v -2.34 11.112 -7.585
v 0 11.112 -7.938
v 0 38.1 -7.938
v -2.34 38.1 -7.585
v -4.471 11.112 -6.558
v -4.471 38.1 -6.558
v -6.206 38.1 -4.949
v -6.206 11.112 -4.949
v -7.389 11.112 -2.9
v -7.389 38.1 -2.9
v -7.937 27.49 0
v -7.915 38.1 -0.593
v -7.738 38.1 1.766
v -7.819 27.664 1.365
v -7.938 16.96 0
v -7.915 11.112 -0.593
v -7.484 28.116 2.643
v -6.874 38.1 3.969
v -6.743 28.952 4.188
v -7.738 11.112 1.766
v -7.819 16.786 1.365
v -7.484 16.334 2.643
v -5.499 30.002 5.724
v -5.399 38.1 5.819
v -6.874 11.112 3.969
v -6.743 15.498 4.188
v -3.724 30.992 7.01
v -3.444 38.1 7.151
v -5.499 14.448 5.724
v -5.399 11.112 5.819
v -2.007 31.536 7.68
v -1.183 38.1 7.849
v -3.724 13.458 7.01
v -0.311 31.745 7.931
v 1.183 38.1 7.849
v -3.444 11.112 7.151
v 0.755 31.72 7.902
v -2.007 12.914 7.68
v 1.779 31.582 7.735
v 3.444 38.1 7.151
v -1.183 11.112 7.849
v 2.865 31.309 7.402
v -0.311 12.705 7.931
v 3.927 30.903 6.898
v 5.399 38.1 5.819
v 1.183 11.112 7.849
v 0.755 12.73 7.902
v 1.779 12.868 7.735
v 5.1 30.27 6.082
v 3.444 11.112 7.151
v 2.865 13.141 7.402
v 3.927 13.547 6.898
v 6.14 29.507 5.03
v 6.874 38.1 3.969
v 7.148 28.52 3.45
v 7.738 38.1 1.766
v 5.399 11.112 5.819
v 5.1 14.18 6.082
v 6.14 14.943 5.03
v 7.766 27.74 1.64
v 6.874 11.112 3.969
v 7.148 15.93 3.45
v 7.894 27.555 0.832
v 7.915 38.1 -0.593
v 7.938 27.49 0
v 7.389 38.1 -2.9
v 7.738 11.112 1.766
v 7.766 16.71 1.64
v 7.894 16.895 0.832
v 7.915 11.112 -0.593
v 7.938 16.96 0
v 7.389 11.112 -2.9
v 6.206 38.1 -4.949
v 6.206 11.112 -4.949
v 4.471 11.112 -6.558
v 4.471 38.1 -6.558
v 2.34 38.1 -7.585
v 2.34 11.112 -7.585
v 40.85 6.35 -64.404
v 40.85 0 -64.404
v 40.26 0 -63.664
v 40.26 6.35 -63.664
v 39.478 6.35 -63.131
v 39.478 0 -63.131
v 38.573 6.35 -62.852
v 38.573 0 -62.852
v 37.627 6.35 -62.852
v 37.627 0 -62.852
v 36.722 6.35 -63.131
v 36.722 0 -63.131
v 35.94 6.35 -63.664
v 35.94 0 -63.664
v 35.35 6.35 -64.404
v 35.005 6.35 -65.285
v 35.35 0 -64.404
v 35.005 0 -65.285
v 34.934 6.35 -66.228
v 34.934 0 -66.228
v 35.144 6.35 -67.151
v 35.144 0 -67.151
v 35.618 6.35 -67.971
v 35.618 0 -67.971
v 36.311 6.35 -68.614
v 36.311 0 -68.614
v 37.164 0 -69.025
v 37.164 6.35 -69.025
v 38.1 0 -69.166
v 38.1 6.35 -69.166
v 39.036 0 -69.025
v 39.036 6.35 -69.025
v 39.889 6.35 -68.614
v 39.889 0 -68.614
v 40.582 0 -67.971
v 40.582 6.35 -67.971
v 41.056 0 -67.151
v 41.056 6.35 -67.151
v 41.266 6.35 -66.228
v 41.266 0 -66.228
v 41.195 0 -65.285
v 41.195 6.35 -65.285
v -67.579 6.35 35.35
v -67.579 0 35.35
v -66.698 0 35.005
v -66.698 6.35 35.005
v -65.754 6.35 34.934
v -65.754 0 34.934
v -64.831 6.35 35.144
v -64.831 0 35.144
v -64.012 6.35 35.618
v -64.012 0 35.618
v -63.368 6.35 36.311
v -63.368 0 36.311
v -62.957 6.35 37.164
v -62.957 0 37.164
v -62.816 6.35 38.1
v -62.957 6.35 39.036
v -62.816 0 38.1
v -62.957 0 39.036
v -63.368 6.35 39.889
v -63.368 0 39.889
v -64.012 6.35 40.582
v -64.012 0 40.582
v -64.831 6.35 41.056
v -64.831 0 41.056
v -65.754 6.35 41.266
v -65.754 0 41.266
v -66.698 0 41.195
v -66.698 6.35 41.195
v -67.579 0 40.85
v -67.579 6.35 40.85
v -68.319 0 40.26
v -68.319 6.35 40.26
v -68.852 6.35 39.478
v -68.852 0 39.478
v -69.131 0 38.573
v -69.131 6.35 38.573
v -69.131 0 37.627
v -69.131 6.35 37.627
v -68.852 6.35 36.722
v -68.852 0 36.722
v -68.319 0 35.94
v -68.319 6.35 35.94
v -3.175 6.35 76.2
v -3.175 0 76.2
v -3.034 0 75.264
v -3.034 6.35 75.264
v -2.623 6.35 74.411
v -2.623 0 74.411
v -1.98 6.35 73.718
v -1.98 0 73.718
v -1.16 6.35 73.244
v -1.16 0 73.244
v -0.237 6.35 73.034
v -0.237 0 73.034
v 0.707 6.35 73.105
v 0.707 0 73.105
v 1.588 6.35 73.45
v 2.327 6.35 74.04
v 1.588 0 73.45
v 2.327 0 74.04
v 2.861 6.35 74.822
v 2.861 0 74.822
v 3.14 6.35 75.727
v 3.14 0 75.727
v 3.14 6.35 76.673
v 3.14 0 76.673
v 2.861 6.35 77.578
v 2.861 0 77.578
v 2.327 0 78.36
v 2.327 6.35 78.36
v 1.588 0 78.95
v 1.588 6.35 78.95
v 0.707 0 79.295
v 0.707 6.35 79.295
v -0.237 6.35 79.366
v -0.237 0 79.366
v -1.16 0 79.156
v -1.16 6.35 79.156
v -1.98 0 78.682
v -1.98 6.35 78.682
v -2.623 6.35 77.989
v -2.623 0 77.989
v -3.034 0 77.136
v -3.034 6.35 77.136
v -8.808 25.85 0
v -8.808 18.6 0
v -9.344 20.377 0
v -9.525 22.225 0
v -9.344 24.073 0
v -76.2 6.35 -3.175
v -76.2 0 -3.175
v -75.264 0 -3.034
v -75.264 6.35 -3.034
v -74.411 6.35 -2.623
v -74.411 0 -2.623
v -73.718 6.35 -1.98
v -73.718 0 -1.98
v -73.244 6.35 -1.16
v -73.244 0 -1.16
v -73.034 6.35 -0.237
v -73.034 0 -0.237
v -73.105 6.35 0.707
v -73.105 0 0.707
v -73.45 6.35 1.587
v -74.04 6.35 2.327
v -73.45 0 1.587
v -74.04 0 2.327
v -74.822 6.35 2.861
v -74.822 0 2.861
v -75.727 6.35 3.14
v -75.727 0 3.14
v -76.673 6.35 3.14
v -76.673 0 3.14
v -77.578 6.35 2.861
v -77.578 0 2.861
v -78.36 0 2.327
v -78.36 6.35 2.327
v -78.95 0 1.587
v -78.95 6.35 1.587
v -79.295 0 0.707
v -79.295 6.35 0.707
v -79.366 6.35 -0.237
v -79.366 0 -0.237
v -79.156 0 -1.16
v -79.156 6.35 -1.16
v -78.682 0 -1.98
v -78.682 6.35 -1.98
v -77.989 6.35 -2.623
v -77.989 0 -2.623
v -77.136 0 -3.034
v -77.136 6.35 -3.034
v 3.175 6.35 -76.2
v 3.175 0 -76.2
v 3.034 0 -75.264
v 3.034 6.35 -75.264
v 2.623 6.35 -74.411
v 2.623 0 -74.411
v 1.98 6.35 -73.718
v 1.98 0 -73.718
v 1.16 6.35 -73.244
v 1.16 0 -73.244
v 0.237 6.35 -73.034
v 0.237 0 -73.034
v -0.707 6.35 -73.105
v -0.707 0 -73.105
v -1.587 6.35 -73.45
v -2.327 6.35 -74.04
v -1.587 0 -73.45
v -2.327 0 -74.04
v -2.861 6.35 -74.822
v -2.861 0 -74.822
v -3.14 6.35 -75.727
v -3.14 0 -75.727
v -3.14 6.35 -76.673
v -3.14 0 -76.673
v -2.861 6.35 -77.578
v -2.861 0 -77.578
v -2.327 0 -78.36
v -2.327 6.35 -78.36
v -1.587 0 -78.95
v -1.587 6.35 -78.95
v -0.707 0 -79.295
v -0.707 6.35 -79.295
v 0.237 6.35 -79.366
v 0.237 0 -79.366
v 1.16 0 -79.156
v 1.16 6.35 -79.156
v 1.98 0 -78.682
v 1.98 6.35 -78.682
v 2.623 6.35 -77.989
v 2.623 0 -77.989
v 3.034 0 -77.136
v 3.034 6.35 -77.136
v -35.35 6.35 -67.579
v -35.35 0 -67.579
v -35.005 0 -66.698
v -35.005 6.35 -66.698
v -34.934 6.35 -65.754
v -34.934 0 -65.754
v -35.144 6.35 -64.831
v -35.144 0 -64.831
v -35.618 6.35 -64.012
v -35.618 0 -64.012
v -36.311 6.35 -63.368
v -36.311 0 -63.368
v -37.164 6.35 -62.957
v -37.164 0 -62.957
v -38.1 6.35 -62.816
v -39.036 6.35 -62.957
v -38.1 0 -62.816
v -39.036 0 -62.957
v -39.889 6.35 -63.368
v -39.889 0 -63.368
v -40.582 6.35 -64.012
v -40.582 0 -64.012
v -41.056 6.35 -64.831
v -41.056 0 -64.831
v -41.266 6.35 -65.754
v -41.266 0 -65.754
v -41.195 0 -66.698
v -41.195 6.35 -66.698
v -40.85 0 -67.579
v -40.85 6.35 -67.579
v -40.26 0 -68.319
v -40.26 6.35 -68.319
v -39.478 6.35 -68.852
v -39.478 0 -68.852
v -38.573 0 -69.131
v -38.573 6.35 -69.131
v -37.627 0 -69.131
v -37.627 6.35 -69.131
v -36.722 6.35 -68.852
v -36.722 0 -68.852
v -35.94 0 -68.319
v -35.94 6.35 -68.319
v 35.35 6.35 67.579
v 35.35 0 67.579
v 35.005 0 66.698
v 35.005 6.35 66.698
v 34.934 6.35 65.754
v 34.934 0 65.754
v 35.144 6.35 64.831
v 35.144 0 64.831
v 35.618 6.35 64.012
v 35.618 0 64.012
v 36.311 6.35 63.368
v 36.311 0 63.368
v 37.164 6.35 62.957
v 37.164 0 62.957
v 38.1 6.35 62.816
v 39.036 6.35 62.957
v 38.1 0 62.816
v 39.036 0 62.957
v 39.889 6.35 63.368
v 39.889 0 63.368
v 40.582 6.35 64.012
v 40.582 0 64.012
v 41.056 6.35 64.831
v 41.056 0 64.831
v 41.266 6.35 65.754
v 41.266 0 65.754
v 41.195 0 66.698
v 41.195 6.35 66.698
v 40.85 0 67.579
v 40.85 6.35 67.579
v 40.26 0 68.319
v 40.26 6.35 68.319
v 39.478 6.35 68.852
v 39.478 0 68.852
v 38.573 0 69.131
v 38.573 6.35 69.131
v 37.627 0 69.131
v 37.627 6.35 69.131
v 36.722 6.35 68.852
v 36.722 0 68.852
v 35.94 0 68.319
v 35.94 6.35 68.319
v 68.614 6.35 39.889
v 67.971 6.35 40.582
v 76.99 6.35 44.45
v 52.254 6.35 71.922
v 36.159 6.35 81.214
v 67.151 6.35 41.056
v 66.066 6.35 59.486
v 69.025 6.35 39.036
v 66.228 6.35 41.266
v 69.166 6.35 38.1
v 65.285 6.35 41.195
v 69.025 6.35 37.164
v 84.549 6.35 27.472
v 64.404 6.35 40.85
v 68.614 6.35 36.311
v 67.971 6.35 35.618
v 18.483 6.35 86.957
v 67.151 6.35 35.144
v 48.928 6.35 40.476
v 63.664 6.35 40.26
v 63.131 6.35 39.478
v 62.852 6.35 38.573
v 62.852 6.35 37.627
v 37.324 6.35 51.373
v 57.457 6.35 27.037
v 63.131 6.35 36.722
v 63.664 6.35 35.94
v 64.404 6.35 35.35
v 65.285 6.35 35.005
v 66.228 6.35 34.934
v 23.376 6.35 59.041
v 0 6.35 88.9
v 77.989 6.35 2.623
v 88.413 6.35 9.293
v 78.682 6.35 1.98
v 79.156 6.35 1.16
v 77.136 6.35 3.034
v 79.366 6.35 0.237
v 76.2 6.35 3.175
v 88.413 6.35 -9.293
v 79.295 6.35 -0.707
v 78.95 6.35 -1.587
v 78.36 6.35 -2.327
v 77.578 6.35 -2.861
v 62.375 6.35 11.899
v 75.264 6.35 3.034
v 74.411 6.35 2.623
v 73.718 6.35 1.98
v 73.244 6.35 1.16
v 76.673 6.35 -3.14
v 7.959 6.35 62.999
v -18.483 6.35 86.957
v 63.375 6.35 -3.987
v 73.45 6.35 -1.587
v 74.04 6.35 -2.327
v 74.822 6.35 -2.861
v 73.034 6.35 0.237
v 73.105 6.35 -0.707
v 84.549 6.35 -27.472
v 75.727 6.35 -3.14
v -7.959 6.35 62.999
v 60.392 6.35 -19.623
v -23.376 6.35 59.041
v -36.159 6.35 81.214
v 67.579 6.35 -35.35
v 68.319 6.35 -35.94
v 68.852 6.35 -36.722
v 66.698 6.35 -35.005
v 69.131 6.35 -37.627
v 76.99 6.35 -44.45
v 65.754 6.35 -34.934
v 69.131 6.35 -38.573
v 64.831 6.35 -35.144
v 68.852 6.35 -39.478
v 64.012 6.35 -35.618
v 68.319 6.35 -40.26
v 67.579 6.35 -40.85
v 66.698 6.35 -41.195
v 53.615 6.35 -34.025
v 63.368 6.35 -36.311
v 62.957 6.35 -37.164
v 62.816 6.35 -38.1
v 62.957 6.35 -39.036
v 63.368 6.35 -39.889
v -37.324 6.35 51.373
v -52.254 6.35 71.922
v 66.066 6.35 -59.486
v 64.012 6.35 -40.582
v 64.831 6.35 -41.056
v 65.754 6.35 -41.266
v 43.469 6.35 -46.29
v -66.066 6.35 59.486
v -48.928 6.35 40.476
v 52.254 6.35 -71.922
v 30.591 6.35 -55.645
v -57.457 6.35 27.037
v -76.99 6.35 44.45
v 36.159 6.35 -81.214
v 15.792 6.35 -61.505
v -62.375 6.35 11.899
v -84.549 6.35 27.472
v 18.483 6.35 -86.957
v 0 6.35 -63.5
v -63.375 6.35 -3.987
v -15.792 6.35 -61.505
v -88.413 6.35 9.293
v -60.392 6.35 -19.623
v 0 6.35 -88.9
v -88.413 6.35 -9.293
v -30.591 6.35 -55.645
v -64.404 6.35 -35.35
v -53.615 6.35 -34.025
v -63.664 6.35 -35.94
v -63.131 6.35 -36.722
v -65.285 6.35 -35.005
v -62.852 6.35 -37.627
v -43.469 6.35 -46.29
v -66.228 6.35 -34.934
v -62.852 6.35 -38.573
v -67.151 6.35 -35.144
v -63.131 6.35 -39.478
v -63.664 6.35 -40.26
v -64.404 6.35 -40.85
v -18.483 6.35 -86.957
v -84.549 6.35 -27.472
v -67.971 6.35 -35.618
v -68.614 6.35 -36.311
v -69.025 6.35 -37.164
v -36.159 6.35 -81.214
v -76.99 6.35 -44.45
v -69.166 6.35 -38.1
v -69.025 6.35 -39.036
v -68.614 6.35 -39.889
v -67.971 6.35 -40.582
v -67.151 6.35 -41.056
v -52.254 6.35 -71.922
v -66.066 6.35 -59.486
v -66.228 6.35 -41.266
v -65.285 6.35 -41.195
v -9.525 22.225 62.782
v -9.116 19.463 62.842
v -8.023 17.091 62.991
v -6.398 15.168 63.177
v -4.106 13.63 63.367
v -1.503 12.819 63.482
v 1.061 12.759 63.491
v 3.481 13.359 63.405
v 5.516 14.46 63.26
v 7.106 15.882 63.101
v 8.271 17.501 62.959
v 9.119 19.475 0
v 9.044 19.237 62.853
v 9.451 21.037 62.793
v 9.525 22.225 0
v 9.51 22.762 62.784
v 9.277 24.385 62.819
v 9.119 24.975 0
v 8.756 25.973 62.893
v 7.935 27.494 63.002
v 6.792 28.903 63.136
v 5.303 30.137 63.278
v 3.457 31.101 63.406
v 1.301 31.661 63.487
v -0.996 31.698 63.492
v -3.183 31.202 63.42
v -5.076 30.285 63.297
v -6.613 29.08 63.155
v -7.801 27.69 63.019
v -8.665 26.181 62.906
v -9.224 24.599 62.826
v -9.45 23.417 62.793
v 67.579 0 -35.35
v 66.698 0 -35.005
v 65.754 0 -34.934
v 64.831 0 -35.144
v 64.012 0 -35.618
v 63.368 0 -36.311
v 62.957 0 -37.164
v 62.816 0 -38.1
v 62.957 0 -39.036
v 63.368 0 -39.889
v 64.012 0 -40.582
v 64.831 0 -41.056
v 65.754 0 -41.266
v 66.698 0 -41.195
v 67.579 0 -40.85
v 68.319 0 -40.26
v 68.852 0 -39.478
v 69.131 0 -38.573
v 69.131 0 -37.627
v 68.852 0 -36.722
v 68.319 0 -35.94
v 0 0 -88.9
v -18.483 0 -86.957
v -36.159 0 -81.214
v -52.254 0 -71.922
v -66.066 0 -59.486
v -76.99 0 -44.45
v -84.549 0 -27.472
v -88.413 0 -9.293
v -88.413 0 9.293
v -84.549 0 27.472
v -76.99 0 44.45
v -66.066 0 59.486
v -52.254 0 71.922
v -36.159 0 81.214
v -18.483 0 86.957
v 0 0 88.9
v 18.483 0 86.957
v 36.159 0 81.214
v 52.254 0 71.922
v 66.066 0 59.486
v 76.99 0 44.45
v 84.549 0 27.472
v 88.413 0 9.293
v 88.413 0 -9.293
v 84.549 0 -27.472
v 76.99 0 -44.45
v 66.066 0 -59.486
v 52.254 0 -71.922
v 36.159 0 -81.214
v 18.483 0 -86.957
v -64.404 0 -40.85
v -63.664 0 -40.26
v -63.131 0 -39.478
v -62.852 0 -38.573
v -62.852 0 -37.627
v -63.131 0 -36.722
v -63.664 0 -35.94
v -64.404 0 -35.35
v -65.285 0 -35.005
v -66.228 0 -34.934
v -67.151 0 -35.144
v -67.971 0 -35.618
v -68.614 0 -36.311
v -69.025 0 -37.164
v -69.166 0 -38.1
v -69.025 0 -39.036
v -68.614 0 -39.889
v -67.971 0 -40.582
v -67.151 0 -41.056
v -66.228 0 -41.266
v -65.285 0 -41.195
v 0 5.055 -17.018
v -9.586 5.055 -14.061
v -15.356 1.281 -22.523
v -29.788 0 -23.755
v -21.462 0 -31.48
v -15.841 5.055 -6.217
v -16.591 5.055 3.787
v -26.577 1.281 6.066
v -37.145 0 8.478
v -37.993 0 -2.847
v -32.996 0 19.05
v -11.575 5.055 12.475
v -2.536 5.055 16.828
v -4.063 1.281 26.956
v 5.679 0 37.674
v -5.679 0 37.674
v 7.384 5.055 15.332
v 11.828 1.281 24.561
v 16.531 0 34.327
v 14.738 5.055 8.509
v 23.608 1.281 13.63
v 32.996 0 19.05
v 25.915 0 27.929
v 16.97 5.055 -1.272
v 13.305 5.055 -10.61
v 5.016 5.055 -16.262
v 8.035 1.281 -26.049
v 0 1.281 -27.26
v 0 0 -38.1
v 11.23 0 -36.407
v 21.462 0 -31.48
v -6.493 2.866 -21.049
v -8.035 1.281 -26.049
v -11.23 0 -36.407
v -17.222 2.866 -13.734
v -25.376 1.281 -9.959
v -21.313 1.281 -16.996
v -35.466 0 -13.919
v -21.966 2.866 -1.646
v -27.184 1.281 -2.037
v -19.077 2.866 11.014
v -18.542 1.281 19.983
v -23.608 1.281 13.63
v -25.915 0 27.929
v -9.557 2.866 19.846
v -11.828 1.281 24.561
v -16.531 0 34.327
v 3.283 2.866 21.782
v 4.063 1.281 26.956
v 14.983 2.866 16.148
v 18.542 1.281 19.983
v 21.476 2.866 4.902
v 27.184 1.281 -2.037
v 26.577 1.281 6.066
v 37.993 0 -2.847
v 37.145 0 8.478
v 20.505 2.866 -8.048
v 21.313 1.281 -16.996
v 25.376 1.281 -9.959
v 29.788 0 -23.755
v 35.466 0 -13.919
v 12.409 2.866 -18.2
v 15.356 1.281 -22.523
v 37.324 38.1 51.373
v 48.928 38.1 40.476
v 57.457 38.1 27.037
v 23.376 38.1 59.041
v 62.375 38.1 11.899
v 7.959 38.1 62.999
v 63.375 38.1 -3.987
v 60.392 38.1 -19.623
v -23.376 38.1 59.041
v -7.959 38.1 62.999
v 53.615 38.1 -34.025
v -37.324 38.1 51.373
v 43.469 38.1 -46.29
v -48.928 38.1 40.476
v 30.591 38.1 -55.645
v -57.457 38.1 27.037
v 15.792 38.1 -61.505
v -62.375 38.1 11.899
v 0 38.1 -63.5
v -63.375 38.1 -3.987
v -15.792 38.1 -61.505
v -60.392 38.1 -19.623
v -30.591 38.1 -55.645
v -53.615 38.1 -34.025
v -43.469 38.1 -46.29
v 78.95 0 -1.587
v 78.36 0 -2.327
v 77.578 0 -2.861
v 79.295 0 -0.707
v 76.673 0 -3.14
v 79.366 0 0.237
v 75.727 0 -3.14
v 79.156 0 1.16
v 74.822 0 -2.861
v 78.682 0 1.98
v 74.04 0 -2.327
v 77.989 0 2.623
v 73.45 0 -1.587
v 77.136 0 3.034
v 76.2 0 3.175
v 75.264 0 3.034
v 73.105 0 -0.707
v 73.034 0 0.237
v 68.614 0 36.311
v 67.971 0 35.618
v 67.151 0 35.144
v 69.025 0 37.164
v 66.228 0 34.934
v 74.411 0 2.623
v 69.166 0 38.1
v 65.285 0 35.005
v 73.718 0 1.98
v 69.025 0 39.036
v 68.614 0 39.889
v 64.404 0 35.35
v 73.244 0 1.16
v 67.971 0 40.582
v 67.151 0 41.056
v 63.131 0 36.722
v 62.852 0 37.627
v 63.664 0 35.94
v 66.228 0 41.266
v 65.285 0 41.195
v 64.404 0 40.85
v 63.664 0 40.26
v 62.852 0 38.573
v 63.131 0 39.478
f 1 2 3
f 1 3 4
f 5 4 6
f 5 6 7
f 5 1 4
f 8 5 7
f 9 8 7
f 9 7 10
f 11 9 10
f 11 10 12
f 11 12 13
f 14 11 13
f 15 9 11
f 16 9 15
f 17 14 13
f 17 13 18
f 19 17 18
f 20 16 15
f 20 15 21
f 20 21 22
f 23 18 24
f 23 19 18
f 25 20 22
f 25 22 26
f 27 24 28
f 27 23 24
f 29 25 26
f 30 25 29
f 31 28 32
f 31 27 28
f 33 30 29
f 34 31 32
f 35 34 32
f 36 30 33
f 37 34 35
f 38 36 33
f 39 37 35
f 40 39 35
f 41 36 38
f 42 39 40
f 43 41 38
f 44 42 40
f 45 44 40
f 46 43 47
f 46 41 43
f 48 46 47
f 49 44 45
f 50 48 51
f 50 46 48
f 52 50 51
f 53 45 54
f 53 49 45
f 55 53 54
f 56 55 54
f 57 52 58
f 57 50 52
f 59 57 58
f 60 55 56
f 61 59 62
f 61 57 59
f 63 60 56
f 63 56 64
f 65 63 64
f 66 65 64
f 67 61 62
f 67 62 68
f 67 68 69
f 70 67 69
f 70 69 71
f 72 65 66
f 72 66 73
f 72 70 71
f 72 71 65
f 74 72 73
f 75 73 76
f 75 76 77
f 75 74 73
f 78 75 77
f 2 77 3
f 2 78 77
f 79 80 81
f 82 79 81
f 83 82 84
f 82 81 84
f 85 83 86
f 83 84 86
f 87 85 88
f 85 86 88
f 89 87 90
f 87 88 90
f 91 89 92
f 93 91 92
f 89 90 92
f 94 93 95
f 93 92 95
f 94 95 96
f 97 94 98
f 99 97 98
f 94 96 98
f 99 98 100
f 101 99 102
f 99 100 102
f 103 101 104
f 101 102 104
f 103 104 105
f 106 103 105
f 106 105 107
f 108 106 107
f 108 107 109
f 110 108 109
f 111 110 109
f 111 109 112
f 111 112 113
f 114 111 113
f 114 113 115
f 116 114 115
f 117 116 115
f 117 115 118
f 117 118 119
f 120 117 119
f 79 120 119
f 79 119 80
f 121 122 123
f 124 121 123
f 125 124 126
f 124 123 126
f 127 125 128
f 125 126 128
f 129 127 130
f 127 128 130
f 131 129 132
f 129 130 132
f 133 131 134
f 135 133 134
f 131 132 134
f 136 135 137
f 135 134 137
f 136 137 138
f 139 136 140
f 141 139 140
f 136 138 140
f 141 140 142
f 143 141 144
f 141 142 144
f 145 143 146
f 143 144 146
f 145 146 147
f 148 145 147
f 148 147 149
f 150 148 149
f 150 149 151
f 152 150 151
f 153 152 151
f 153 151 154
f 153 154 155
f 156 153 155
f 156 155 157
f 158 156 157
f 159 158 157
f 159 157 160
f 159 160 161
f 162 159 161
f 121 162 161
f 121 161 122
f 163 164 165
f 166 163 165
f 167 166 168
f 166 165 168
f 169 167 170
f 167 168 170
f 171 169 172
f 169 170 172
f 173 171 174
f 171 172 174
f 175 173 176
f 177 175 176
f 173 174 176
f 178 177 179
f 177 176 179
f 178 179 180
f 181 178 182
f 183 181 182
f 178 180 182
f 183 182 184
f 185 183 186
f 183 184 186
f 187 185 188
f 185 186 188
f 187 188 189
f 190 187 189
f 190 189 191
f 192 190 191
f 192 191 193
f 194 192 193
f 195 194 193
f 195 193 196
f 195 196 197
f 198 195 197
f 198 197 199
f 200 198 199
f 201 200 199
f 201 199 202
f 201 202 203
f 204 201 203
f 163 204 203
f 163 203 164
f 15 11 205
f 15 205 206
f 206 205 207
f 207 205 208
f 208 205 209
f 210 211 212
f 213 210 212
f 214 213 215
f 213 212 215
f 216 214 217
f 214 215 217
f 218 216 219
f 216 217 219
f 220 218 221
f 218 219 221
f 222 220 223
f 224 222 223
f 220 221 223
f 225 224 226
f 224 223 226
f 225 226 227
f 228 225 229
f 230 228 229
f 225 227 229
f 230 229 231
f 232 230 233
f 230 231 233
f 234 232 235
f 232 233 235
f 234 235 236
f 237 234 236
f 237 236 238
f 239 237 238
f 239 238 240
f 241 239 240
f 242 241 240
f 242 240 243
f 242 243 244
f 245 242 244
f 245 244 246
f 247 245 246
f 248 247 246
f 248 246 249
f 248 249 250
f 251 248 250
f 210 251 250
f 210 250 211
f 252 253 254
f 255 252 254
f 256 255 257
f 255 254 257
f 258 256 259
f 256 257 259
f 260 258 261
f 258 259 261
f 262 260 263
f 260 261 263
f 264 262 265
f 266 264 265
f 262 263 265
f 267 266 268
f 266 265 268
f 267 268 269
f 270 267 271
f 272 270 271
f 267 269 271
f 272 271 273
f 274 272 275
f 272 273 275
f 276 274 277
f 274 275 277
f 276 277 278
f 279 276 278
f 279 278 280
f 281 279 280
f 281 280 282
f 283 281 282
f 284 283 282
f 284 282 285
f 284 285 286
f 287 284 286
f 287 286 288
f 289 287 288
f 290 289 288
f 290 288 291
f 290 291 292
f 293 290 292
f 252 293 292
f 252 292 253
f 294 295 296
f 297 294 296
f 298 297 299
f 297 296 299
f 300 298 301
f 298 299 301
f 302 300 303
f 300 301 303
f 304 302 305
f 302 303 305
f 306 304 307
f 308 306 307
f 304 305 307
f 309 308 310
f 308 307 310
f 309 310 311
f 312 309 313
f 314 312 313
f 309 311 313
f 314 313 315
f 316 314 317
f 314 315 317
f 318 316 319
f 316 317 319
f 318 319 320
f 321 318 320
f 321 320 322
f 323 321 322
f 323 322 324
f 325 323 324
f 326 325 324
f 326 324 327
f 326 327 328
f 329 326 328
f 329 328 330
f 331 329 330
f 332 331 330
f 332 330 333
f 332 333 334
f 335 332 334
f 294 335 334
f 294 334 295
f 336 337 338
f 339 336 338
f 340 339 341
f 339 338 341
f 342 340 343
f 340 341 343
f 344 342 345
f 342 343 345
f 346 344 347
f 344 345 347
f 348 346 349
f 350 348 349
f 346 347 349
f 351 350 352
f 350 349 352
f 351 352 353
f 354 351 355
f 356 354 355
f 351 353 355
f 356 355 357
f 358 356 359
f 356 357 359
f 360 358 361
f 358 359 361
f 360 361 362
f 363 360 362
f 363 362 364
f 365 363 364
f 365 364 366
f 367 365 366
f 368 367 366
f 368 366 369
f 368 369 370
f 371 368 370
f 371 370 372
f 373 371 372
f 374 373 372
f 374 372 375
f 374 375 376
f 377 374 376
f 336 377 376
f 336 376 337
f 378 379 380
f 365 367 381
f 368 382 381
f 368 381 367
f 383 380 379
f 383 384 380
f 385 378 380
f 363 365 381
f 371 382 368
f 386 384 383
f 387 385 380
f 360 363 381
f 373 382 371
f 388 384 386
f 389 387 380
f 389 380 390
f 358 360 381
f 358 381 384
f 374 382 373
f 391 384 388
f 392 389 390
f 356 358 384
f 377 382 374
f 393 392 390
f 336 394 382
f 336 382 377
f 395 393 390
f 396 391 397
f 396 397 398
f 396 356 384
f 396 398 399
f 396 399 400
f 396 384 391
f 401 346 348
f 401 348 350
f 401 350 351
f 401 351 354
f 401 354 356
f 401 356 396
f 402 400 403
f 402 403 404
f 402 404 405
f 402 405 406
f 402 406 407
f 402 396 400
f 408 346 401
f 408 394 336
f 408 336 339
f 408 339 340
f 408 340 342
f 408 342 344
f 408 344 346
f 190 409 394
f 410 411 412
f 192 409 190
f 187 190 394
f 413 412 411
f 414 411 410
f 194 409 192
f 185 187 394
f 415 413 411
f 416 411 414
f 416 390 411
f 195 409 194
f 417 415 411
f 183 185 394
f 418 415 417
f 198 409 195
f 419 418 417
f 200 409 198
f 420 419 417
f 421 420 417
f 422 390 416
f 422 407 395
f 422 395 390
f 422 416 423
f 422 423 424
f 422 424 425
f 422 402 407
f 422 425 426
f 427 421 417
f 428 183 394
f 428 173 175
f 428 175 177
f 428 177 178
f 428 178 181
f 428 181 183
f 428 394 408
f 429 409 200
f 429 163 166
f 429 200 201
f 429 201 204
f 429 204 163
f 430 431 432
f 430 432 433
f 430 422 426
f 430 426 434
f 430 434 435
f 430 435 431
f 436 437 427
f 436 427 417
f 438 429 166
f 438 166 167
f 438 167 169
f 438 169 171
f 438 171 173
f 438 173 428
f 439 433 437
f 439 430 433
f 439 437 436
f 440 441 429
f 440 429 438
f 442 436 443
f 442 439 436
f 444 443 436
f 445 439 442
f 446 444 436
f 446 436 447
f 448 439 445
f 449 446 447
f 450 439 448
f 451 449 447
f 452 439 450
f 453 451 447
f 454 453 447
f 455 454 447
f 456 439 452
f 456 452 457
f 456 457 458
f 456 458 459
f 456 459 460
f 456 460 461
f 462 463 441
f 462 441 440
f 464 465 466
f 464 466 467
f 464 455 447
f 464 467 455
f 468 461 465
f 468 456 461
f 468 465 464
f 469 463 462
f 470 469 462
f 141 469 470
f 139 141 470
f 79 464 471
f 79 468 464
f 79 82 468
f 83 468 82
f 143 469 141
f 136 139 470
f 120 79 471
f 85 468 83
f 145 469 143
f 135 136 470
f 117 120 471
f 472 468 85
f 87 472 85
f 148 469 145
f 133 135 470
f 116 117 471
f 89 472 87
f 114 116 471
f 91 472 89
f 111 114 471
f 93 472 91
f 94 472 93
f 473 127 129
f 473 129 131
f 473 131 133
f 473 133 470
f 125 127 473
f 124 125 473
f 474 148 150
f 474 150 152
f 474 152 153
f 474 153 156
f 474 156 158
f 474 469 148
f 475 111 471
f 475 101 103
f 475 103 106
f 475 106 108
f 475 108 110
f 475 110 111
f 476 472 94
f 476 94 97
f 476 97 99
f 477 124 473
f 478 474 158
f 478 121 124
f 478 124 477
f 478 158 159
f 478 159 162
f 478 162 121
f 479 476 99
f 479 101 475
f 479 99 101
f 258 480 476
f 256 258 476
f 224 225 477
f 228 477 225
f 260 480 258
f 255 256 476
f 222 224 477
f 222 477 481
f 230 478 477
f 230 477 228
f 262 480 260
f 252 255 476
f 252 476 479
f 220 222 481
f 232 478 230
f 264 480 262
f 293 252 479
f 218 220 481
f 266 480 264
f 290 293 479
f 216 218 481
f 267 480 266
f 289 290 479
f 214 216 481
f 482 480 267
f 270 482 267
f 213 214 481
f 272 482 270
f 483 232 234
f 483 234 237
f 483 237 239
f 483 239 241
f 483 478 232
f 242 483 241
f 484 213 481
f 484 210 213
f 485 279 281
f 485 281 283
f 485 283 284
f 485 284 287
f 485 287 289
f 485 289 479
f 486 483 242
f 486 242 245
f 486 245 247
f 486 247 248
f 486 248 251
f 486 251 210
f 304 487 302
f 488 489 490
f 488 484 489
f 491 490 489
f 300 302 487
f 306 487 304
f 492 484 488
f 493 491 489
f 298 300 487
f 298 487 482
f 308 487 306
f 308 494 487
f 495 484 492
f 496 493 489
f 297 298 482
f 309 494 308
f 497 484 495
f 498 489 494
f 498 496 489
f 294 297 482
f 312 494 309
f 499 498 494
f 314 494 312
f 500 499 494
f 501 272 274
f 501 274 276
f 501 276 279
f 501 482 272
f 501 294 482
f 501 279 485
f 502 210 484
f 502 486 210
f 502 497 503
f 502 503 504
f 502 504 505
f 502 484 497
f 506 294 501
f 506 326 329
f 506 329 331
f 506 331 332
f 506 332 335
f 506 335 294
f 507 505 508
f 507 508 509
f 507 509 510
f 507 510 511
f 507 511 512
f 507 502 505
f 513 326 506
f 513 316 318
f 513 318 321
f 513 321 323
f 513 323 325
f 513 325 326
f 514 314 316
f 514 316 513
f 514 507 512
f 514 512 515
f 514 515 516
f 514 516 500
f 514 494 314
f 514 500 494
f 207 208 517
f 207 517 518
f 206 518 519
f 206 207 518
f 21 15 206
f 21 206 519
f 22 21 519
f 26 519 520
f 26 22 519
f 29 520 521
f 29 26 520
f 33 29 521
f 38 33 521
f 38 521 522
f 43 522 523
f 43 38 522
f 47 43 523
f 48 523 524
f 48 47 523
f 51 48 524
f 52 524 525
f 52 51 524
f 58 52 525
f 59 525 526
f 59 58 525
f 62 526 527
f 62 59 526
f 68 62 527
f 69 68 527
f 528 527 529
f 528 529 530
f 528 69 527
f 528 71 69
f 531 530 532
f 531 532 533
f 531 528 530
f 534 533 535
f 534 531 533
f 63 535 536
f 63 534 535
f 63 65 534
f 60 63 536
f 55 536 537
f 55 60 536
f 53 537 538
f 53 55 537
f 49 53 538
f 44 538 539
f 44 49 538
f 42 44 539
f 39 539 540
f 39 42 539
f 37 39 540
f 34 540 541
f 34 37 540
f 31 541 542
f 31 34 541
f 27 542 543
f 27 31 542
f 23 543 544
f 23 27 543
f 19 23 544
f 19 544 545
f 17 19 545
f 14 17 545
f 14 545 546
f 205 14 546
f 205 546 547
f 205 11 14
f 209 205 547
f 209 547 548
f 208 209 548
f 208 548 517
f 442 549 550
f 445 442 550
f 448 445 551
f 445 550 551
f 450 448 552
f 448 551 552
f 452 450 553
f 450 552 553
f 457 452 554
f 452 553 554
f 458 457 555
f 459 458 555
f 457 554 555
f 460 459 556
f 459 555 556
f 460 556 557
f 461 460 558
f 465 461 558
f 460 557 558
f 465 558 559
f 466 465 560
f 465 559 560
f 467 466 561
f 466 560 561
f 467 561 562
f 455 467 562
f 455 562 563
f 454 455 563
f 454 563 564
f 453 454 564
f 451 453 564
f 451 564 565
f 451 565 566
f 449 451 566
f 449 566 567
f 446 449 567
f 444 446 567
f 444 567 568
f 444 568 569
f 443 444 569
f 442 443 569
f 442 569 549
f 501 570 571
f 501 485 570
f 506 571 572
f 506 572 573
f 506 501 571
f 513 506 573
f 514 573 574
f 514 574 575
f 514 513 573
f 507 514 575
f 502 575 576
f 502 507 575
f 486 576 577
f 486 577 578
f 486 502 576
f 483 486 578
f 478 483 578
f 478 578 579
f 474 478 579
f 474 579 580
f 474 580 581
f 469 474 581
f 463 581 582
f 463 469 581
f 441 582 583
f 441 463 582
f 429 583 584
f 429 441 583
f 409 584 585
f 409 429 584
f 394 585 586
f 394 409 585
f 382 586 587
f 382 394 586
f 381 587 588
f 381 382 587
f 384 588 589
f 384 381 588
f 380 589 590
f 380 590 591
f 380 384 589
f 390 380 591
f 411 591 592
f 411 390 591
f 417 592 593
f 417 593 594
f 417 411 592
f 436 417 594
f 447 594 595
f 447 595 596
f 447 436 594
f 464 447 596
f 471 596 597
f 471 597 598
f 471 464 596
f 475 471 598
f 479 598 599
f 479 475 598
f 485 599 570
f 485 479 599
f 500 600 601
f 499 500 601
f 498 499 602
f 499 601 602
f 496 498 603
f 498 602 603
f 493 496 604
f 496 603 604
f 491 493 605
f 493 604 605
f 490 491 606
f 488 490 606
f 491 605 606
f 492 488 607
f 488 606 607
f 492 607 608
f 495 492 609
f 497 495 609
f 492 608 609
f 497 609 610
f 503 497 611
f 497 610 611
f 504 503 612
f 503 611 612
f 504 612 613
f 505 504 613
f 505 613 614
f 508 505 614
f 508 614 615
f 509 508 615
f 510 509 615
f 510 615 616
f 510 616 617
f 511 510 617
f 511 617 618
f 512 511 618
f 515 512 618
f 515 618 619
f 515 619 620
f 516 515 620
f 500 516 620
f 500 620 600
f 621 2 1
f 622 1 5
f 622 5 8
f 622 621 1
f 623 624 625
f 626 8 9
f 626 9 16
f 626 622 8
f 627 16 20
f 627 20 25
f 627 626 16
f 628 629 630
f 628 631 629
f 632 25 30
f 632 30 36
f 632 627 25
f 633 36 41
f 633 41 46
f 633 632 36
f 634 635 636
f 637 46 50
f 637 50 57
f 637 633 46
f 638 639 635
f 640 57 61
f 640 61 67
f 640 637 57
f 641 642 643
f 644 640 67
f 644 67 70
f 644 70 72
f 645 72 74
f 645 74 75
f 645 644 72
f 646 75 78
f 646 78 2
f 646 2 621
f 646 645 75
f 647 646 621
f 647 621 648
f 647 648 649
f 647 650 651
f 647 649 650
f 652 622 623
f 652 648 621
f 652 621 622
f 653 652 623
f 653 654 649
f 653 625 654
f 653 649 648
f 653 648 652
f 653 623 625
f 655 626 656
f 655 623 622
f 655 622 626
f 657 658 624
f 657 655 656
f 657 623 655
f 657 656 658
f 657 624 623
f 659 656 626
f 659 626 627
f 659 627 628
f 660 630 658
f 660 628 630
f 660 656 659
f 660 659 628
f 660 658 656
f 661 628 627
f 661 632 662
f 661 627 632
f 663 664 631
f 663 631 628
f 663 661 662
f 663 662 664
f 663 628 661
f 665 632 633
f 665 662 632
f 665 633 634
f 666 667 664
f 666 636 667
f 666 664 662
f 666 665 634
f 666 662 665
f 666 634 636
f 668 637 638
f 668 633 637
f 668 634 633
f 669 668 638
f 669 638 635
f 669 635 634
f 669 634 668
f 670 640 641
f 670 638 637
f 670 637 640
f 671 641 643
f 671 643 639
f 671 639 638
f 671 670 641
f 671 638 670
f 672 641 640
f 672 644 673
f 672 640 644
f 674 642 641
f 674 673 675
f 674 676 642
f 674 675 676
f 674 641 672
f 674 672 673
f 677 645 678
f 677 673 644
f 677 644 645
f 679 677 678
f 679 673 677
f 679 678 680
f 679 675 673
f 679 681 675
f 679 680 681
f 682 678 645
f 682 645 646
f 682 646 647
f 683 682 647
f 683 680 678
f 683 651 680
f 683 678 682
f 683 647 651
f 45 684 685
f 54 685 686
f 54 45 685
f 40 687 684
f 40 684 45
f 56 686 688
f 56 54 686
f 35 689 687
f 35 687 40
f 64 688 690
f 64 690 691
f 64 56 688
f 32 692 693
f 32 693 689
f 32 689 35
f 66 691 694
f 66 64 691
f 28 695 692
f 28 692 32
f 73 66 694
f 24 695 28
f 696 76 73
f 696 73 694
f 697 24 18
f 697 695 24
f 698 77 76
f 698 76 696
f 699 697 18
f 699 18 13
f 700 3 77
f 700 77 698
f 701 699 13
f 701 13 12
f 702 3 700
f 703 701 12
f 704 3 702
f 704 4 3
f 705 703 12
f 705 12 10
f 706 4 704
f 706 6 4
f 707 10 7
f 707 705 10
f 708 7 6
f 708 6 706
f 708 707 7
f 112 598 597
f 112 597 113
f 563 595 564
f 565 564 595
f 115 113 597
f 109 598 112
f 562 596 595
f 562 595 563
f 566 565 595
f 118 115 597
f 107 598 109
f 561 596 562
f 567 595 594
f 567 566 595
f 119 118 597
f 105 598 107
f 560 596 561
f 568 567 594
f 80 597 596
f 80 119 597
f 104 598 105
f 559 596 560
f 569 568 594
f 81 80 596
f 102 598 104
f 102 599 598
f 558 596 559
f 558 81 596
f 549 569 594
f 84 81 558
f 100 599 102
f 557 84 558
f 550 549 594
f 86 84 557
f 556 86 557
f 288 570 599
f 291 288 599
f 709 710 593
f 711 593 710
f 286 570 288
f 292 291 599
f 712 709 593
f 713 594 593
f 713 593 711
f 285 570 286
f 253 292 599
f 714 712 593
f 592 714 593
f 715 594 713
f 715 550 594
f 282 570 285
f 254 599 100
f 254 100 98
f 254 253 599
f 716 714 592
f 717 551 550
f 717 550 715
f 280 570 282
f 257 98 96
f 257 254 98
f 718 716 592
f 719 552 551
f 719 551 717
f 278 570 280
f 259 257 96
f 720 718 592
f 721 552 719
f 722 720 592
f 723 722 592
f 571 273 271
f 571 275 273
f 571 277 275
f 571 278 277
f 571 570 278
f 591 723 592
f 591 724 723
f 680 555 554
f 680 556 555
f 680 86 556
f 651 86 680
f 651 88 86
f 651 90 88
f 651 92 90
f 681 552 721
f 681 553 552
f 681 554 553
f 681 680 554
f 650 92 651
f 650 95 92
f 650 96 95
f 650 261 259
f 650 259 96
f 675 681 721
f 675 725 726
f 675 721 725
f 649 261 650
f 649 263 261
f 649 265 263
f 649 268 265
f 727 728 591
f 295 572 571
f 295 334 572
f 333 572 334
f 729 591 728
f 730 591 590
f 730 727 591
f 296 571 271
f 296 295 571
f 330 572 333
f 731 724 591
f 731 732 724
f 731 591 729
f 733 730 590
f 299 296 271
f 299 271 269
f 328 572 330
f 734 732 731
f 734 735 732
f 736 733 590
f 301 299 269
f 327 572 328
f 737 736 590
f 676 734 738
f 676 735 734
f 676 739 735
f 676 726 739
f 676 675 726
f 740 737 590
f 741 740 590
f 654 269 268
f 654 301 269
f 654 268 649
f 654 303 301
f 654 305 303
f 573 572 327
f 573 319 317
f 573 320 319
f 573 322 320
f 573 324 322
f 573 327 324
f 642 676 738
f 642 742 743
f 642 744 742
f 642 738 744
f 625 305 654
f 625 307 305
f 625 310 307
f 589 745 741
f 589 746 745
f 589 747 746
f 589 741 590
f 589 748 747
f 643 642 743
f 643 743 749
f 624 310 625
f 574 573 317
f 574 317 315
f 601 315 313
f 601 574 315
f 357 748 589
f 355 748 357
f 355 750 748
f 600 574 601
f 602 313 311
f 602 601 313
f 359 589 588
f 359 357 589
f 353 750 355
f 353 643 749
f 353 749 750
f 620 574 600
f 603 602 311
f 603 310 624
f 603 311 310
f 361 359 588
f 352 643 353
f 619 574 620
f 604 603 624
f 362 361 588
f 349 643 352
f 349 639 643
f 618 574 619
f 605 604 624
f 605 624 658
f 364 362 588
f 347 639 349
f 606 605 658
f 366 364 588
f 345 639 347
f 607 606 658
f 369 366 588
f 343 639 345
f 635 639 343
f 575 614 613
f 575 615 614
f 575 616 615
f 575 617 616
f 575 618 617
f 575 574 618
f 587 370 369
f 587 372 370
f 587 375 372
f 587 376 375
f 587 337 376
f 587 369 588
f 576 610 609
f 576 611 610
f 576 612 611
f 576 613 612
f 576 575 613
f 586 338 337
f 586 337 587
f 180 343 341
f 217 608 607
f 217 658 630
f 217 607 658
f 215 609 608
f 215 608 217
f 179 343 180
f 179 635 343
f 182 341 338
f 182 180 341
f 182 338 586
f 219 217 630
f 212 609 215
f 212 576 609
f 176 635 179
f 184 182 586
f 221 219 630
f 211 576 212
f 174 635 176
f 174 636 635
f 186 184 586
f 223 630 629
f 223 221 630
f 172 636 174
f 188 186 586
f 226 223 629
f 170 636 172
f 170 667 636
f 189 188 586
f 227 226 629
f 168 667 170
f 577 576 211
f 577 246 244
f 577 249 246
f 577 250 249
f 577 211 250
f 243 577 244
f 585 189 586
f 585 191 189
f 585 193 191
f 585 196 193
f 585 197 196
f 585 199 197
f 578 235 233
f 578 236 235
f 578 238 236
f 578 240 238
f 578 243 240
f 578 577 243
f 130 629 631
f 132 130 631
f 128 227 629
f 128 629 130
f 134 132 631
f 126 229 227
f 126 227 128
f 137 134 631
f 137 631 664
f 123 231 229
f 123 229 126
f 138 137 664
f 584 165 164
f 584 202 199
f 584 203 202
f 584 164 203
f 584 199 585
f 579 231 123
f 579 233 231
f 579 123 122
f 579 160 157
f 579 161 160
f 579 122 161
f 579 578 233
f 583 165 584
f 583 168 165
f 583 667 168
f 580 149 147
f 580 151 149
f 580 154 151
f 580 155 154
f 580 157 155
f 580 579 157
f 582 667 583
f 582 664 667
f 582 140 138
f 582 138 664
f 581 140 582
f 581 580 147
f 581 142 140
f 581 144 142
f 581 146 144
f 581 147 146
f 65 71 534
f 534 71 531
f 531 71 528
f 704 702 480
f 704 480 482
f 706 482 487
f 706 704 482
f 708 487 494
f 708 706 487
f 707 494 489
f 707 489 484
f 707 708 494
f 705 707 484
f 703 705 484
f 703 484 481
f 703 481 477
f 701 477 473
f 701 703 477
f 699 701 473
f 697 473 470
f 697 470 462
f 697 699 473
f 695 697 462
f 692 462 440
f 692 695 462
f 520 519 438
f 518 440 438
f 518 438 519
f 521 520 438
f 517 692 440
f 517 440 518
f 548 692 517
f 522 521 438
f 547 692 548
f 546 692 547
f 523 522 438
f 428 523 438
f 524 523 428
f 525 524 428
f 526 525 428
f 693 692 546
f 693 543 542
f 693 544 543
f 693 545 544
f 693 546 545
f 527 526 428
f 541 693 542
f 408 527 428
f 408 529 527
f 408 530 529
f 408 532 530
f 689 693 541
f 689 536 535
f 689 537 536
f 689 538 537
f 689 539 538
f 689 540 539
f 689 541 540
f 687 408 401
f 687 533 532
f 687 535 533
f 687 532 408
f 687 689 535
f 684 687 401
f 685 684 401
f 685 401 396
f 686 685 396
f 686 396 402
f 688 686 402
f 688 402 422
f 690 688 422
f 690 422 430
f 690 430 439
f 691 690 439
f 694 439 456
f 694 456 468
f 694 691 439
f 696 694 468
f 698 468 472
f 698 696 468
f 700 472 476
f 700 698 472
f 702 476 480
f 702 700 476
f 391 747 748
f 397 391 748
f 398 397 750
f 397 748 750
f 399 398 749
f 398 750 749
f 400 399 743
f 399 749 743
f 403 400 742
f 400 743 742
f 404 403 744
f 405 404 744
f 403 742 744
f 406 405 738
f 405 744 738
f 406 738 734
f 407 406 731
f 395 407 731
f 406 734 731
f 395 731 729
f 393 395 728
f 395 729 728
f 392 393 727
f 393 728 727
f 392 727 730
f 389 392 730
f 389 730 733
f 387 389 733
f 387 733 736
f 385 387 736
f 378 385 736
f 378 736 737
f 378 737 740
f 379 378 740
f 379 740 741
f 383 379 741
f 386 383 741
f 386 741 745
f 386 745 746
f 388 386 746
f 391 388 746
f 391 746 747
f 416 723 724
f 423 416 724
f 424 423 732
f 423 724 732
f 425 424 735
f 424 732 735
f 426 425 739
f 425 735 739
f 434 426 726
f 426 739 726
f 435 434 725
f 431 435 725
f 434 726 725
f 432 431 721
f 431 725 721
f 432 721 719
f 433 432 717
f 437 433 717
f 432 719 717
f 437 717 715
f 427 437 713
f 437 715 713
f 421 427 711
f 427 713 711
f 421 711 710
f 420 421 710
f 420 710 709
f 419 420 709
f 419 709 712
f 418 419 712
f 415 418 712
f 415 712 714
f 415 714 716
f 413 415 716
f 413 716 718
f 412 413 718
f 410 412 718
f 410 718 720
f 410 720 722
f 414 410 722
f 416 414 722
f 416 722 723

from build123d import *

# Parameters (mm, degrees)
F_1_4_0_25_DIAMETER_HOLE1_D = 6.35
CIRPATTERN2_COUNT           = 12
SKETCH6_R                   = 9.525
CUT_EXTRUDE1_DEPTH          = 132.369821496


with BuildPart() as part:
    # Sketch1 → Revolve1 (revolve)
    with BuildSketch(Plane.XY, mode=Mode.PRIVATE) as revolve1_sk:
        with BuildLine():
            Line((7.9375, 38.1), (7.9375, 11.1125))
            ThreePointArc((7.9375, 11.1125), (22.02778747, 2.86649456), (38.1, 0))
            Line((38.1, 0), (88.9, 0))
            Line((88.9, 0), (88.9, 6.35))
            Line((88.9, 6.35), (63.5, 6.35))
            Line((63.5, 6.35), (63.5, 38.1))
            Line((63.5, 38.1), (7.9375, 38.1))
        make_face()
    revolve(revolve1_sk.sketch.rotate(Axis((0, 0, 0), (0, 1, 0)), 90), axis=Axis((0, 0, 0), (0, 1, 0)))

    # 1/4 (0.25) Diameter Hole1 (through all)
    with Locations(Plane(origin=(0, 6.35, 0), x_dir=(1, 0, 0), z_dir=(0, 1, 0))):
        with Locations((0, -76.2)):
            f_1_4_0_25_diameter_hole1 = Hole(F_1_4_0_25_DIAMETER_HOLE1_D / 2)

    # CirPattern2: 1/4 (0.25) Diameter Hole1 ×12 about axis, 1 skipped
    cirpattern2_axis = Axis((0, 0, 0), (0, 1, 0))
    add([f_1_4_0_25_diameter_hole1.rotate(cirpattern2_axis, i * 360 / CIRPATTERN2_COUNT) for i in range(1, CIRPATTERN2_COUNT) if i not in (11,)], mode=Mode.SUBTRACT)

    # Sketch6 → Cut-Extrude1 (cut, through all)
    with BuildSketch(Plane.XY):
        with Locations(Location((0, 22.225, 0), (0, 0, 180))):
            Circle(SKETCH6_R)
    extrude(amount=CUT_EXTRUDE1_DEPTH, mode=Mode.SUBTRACT)


solid = part.part
